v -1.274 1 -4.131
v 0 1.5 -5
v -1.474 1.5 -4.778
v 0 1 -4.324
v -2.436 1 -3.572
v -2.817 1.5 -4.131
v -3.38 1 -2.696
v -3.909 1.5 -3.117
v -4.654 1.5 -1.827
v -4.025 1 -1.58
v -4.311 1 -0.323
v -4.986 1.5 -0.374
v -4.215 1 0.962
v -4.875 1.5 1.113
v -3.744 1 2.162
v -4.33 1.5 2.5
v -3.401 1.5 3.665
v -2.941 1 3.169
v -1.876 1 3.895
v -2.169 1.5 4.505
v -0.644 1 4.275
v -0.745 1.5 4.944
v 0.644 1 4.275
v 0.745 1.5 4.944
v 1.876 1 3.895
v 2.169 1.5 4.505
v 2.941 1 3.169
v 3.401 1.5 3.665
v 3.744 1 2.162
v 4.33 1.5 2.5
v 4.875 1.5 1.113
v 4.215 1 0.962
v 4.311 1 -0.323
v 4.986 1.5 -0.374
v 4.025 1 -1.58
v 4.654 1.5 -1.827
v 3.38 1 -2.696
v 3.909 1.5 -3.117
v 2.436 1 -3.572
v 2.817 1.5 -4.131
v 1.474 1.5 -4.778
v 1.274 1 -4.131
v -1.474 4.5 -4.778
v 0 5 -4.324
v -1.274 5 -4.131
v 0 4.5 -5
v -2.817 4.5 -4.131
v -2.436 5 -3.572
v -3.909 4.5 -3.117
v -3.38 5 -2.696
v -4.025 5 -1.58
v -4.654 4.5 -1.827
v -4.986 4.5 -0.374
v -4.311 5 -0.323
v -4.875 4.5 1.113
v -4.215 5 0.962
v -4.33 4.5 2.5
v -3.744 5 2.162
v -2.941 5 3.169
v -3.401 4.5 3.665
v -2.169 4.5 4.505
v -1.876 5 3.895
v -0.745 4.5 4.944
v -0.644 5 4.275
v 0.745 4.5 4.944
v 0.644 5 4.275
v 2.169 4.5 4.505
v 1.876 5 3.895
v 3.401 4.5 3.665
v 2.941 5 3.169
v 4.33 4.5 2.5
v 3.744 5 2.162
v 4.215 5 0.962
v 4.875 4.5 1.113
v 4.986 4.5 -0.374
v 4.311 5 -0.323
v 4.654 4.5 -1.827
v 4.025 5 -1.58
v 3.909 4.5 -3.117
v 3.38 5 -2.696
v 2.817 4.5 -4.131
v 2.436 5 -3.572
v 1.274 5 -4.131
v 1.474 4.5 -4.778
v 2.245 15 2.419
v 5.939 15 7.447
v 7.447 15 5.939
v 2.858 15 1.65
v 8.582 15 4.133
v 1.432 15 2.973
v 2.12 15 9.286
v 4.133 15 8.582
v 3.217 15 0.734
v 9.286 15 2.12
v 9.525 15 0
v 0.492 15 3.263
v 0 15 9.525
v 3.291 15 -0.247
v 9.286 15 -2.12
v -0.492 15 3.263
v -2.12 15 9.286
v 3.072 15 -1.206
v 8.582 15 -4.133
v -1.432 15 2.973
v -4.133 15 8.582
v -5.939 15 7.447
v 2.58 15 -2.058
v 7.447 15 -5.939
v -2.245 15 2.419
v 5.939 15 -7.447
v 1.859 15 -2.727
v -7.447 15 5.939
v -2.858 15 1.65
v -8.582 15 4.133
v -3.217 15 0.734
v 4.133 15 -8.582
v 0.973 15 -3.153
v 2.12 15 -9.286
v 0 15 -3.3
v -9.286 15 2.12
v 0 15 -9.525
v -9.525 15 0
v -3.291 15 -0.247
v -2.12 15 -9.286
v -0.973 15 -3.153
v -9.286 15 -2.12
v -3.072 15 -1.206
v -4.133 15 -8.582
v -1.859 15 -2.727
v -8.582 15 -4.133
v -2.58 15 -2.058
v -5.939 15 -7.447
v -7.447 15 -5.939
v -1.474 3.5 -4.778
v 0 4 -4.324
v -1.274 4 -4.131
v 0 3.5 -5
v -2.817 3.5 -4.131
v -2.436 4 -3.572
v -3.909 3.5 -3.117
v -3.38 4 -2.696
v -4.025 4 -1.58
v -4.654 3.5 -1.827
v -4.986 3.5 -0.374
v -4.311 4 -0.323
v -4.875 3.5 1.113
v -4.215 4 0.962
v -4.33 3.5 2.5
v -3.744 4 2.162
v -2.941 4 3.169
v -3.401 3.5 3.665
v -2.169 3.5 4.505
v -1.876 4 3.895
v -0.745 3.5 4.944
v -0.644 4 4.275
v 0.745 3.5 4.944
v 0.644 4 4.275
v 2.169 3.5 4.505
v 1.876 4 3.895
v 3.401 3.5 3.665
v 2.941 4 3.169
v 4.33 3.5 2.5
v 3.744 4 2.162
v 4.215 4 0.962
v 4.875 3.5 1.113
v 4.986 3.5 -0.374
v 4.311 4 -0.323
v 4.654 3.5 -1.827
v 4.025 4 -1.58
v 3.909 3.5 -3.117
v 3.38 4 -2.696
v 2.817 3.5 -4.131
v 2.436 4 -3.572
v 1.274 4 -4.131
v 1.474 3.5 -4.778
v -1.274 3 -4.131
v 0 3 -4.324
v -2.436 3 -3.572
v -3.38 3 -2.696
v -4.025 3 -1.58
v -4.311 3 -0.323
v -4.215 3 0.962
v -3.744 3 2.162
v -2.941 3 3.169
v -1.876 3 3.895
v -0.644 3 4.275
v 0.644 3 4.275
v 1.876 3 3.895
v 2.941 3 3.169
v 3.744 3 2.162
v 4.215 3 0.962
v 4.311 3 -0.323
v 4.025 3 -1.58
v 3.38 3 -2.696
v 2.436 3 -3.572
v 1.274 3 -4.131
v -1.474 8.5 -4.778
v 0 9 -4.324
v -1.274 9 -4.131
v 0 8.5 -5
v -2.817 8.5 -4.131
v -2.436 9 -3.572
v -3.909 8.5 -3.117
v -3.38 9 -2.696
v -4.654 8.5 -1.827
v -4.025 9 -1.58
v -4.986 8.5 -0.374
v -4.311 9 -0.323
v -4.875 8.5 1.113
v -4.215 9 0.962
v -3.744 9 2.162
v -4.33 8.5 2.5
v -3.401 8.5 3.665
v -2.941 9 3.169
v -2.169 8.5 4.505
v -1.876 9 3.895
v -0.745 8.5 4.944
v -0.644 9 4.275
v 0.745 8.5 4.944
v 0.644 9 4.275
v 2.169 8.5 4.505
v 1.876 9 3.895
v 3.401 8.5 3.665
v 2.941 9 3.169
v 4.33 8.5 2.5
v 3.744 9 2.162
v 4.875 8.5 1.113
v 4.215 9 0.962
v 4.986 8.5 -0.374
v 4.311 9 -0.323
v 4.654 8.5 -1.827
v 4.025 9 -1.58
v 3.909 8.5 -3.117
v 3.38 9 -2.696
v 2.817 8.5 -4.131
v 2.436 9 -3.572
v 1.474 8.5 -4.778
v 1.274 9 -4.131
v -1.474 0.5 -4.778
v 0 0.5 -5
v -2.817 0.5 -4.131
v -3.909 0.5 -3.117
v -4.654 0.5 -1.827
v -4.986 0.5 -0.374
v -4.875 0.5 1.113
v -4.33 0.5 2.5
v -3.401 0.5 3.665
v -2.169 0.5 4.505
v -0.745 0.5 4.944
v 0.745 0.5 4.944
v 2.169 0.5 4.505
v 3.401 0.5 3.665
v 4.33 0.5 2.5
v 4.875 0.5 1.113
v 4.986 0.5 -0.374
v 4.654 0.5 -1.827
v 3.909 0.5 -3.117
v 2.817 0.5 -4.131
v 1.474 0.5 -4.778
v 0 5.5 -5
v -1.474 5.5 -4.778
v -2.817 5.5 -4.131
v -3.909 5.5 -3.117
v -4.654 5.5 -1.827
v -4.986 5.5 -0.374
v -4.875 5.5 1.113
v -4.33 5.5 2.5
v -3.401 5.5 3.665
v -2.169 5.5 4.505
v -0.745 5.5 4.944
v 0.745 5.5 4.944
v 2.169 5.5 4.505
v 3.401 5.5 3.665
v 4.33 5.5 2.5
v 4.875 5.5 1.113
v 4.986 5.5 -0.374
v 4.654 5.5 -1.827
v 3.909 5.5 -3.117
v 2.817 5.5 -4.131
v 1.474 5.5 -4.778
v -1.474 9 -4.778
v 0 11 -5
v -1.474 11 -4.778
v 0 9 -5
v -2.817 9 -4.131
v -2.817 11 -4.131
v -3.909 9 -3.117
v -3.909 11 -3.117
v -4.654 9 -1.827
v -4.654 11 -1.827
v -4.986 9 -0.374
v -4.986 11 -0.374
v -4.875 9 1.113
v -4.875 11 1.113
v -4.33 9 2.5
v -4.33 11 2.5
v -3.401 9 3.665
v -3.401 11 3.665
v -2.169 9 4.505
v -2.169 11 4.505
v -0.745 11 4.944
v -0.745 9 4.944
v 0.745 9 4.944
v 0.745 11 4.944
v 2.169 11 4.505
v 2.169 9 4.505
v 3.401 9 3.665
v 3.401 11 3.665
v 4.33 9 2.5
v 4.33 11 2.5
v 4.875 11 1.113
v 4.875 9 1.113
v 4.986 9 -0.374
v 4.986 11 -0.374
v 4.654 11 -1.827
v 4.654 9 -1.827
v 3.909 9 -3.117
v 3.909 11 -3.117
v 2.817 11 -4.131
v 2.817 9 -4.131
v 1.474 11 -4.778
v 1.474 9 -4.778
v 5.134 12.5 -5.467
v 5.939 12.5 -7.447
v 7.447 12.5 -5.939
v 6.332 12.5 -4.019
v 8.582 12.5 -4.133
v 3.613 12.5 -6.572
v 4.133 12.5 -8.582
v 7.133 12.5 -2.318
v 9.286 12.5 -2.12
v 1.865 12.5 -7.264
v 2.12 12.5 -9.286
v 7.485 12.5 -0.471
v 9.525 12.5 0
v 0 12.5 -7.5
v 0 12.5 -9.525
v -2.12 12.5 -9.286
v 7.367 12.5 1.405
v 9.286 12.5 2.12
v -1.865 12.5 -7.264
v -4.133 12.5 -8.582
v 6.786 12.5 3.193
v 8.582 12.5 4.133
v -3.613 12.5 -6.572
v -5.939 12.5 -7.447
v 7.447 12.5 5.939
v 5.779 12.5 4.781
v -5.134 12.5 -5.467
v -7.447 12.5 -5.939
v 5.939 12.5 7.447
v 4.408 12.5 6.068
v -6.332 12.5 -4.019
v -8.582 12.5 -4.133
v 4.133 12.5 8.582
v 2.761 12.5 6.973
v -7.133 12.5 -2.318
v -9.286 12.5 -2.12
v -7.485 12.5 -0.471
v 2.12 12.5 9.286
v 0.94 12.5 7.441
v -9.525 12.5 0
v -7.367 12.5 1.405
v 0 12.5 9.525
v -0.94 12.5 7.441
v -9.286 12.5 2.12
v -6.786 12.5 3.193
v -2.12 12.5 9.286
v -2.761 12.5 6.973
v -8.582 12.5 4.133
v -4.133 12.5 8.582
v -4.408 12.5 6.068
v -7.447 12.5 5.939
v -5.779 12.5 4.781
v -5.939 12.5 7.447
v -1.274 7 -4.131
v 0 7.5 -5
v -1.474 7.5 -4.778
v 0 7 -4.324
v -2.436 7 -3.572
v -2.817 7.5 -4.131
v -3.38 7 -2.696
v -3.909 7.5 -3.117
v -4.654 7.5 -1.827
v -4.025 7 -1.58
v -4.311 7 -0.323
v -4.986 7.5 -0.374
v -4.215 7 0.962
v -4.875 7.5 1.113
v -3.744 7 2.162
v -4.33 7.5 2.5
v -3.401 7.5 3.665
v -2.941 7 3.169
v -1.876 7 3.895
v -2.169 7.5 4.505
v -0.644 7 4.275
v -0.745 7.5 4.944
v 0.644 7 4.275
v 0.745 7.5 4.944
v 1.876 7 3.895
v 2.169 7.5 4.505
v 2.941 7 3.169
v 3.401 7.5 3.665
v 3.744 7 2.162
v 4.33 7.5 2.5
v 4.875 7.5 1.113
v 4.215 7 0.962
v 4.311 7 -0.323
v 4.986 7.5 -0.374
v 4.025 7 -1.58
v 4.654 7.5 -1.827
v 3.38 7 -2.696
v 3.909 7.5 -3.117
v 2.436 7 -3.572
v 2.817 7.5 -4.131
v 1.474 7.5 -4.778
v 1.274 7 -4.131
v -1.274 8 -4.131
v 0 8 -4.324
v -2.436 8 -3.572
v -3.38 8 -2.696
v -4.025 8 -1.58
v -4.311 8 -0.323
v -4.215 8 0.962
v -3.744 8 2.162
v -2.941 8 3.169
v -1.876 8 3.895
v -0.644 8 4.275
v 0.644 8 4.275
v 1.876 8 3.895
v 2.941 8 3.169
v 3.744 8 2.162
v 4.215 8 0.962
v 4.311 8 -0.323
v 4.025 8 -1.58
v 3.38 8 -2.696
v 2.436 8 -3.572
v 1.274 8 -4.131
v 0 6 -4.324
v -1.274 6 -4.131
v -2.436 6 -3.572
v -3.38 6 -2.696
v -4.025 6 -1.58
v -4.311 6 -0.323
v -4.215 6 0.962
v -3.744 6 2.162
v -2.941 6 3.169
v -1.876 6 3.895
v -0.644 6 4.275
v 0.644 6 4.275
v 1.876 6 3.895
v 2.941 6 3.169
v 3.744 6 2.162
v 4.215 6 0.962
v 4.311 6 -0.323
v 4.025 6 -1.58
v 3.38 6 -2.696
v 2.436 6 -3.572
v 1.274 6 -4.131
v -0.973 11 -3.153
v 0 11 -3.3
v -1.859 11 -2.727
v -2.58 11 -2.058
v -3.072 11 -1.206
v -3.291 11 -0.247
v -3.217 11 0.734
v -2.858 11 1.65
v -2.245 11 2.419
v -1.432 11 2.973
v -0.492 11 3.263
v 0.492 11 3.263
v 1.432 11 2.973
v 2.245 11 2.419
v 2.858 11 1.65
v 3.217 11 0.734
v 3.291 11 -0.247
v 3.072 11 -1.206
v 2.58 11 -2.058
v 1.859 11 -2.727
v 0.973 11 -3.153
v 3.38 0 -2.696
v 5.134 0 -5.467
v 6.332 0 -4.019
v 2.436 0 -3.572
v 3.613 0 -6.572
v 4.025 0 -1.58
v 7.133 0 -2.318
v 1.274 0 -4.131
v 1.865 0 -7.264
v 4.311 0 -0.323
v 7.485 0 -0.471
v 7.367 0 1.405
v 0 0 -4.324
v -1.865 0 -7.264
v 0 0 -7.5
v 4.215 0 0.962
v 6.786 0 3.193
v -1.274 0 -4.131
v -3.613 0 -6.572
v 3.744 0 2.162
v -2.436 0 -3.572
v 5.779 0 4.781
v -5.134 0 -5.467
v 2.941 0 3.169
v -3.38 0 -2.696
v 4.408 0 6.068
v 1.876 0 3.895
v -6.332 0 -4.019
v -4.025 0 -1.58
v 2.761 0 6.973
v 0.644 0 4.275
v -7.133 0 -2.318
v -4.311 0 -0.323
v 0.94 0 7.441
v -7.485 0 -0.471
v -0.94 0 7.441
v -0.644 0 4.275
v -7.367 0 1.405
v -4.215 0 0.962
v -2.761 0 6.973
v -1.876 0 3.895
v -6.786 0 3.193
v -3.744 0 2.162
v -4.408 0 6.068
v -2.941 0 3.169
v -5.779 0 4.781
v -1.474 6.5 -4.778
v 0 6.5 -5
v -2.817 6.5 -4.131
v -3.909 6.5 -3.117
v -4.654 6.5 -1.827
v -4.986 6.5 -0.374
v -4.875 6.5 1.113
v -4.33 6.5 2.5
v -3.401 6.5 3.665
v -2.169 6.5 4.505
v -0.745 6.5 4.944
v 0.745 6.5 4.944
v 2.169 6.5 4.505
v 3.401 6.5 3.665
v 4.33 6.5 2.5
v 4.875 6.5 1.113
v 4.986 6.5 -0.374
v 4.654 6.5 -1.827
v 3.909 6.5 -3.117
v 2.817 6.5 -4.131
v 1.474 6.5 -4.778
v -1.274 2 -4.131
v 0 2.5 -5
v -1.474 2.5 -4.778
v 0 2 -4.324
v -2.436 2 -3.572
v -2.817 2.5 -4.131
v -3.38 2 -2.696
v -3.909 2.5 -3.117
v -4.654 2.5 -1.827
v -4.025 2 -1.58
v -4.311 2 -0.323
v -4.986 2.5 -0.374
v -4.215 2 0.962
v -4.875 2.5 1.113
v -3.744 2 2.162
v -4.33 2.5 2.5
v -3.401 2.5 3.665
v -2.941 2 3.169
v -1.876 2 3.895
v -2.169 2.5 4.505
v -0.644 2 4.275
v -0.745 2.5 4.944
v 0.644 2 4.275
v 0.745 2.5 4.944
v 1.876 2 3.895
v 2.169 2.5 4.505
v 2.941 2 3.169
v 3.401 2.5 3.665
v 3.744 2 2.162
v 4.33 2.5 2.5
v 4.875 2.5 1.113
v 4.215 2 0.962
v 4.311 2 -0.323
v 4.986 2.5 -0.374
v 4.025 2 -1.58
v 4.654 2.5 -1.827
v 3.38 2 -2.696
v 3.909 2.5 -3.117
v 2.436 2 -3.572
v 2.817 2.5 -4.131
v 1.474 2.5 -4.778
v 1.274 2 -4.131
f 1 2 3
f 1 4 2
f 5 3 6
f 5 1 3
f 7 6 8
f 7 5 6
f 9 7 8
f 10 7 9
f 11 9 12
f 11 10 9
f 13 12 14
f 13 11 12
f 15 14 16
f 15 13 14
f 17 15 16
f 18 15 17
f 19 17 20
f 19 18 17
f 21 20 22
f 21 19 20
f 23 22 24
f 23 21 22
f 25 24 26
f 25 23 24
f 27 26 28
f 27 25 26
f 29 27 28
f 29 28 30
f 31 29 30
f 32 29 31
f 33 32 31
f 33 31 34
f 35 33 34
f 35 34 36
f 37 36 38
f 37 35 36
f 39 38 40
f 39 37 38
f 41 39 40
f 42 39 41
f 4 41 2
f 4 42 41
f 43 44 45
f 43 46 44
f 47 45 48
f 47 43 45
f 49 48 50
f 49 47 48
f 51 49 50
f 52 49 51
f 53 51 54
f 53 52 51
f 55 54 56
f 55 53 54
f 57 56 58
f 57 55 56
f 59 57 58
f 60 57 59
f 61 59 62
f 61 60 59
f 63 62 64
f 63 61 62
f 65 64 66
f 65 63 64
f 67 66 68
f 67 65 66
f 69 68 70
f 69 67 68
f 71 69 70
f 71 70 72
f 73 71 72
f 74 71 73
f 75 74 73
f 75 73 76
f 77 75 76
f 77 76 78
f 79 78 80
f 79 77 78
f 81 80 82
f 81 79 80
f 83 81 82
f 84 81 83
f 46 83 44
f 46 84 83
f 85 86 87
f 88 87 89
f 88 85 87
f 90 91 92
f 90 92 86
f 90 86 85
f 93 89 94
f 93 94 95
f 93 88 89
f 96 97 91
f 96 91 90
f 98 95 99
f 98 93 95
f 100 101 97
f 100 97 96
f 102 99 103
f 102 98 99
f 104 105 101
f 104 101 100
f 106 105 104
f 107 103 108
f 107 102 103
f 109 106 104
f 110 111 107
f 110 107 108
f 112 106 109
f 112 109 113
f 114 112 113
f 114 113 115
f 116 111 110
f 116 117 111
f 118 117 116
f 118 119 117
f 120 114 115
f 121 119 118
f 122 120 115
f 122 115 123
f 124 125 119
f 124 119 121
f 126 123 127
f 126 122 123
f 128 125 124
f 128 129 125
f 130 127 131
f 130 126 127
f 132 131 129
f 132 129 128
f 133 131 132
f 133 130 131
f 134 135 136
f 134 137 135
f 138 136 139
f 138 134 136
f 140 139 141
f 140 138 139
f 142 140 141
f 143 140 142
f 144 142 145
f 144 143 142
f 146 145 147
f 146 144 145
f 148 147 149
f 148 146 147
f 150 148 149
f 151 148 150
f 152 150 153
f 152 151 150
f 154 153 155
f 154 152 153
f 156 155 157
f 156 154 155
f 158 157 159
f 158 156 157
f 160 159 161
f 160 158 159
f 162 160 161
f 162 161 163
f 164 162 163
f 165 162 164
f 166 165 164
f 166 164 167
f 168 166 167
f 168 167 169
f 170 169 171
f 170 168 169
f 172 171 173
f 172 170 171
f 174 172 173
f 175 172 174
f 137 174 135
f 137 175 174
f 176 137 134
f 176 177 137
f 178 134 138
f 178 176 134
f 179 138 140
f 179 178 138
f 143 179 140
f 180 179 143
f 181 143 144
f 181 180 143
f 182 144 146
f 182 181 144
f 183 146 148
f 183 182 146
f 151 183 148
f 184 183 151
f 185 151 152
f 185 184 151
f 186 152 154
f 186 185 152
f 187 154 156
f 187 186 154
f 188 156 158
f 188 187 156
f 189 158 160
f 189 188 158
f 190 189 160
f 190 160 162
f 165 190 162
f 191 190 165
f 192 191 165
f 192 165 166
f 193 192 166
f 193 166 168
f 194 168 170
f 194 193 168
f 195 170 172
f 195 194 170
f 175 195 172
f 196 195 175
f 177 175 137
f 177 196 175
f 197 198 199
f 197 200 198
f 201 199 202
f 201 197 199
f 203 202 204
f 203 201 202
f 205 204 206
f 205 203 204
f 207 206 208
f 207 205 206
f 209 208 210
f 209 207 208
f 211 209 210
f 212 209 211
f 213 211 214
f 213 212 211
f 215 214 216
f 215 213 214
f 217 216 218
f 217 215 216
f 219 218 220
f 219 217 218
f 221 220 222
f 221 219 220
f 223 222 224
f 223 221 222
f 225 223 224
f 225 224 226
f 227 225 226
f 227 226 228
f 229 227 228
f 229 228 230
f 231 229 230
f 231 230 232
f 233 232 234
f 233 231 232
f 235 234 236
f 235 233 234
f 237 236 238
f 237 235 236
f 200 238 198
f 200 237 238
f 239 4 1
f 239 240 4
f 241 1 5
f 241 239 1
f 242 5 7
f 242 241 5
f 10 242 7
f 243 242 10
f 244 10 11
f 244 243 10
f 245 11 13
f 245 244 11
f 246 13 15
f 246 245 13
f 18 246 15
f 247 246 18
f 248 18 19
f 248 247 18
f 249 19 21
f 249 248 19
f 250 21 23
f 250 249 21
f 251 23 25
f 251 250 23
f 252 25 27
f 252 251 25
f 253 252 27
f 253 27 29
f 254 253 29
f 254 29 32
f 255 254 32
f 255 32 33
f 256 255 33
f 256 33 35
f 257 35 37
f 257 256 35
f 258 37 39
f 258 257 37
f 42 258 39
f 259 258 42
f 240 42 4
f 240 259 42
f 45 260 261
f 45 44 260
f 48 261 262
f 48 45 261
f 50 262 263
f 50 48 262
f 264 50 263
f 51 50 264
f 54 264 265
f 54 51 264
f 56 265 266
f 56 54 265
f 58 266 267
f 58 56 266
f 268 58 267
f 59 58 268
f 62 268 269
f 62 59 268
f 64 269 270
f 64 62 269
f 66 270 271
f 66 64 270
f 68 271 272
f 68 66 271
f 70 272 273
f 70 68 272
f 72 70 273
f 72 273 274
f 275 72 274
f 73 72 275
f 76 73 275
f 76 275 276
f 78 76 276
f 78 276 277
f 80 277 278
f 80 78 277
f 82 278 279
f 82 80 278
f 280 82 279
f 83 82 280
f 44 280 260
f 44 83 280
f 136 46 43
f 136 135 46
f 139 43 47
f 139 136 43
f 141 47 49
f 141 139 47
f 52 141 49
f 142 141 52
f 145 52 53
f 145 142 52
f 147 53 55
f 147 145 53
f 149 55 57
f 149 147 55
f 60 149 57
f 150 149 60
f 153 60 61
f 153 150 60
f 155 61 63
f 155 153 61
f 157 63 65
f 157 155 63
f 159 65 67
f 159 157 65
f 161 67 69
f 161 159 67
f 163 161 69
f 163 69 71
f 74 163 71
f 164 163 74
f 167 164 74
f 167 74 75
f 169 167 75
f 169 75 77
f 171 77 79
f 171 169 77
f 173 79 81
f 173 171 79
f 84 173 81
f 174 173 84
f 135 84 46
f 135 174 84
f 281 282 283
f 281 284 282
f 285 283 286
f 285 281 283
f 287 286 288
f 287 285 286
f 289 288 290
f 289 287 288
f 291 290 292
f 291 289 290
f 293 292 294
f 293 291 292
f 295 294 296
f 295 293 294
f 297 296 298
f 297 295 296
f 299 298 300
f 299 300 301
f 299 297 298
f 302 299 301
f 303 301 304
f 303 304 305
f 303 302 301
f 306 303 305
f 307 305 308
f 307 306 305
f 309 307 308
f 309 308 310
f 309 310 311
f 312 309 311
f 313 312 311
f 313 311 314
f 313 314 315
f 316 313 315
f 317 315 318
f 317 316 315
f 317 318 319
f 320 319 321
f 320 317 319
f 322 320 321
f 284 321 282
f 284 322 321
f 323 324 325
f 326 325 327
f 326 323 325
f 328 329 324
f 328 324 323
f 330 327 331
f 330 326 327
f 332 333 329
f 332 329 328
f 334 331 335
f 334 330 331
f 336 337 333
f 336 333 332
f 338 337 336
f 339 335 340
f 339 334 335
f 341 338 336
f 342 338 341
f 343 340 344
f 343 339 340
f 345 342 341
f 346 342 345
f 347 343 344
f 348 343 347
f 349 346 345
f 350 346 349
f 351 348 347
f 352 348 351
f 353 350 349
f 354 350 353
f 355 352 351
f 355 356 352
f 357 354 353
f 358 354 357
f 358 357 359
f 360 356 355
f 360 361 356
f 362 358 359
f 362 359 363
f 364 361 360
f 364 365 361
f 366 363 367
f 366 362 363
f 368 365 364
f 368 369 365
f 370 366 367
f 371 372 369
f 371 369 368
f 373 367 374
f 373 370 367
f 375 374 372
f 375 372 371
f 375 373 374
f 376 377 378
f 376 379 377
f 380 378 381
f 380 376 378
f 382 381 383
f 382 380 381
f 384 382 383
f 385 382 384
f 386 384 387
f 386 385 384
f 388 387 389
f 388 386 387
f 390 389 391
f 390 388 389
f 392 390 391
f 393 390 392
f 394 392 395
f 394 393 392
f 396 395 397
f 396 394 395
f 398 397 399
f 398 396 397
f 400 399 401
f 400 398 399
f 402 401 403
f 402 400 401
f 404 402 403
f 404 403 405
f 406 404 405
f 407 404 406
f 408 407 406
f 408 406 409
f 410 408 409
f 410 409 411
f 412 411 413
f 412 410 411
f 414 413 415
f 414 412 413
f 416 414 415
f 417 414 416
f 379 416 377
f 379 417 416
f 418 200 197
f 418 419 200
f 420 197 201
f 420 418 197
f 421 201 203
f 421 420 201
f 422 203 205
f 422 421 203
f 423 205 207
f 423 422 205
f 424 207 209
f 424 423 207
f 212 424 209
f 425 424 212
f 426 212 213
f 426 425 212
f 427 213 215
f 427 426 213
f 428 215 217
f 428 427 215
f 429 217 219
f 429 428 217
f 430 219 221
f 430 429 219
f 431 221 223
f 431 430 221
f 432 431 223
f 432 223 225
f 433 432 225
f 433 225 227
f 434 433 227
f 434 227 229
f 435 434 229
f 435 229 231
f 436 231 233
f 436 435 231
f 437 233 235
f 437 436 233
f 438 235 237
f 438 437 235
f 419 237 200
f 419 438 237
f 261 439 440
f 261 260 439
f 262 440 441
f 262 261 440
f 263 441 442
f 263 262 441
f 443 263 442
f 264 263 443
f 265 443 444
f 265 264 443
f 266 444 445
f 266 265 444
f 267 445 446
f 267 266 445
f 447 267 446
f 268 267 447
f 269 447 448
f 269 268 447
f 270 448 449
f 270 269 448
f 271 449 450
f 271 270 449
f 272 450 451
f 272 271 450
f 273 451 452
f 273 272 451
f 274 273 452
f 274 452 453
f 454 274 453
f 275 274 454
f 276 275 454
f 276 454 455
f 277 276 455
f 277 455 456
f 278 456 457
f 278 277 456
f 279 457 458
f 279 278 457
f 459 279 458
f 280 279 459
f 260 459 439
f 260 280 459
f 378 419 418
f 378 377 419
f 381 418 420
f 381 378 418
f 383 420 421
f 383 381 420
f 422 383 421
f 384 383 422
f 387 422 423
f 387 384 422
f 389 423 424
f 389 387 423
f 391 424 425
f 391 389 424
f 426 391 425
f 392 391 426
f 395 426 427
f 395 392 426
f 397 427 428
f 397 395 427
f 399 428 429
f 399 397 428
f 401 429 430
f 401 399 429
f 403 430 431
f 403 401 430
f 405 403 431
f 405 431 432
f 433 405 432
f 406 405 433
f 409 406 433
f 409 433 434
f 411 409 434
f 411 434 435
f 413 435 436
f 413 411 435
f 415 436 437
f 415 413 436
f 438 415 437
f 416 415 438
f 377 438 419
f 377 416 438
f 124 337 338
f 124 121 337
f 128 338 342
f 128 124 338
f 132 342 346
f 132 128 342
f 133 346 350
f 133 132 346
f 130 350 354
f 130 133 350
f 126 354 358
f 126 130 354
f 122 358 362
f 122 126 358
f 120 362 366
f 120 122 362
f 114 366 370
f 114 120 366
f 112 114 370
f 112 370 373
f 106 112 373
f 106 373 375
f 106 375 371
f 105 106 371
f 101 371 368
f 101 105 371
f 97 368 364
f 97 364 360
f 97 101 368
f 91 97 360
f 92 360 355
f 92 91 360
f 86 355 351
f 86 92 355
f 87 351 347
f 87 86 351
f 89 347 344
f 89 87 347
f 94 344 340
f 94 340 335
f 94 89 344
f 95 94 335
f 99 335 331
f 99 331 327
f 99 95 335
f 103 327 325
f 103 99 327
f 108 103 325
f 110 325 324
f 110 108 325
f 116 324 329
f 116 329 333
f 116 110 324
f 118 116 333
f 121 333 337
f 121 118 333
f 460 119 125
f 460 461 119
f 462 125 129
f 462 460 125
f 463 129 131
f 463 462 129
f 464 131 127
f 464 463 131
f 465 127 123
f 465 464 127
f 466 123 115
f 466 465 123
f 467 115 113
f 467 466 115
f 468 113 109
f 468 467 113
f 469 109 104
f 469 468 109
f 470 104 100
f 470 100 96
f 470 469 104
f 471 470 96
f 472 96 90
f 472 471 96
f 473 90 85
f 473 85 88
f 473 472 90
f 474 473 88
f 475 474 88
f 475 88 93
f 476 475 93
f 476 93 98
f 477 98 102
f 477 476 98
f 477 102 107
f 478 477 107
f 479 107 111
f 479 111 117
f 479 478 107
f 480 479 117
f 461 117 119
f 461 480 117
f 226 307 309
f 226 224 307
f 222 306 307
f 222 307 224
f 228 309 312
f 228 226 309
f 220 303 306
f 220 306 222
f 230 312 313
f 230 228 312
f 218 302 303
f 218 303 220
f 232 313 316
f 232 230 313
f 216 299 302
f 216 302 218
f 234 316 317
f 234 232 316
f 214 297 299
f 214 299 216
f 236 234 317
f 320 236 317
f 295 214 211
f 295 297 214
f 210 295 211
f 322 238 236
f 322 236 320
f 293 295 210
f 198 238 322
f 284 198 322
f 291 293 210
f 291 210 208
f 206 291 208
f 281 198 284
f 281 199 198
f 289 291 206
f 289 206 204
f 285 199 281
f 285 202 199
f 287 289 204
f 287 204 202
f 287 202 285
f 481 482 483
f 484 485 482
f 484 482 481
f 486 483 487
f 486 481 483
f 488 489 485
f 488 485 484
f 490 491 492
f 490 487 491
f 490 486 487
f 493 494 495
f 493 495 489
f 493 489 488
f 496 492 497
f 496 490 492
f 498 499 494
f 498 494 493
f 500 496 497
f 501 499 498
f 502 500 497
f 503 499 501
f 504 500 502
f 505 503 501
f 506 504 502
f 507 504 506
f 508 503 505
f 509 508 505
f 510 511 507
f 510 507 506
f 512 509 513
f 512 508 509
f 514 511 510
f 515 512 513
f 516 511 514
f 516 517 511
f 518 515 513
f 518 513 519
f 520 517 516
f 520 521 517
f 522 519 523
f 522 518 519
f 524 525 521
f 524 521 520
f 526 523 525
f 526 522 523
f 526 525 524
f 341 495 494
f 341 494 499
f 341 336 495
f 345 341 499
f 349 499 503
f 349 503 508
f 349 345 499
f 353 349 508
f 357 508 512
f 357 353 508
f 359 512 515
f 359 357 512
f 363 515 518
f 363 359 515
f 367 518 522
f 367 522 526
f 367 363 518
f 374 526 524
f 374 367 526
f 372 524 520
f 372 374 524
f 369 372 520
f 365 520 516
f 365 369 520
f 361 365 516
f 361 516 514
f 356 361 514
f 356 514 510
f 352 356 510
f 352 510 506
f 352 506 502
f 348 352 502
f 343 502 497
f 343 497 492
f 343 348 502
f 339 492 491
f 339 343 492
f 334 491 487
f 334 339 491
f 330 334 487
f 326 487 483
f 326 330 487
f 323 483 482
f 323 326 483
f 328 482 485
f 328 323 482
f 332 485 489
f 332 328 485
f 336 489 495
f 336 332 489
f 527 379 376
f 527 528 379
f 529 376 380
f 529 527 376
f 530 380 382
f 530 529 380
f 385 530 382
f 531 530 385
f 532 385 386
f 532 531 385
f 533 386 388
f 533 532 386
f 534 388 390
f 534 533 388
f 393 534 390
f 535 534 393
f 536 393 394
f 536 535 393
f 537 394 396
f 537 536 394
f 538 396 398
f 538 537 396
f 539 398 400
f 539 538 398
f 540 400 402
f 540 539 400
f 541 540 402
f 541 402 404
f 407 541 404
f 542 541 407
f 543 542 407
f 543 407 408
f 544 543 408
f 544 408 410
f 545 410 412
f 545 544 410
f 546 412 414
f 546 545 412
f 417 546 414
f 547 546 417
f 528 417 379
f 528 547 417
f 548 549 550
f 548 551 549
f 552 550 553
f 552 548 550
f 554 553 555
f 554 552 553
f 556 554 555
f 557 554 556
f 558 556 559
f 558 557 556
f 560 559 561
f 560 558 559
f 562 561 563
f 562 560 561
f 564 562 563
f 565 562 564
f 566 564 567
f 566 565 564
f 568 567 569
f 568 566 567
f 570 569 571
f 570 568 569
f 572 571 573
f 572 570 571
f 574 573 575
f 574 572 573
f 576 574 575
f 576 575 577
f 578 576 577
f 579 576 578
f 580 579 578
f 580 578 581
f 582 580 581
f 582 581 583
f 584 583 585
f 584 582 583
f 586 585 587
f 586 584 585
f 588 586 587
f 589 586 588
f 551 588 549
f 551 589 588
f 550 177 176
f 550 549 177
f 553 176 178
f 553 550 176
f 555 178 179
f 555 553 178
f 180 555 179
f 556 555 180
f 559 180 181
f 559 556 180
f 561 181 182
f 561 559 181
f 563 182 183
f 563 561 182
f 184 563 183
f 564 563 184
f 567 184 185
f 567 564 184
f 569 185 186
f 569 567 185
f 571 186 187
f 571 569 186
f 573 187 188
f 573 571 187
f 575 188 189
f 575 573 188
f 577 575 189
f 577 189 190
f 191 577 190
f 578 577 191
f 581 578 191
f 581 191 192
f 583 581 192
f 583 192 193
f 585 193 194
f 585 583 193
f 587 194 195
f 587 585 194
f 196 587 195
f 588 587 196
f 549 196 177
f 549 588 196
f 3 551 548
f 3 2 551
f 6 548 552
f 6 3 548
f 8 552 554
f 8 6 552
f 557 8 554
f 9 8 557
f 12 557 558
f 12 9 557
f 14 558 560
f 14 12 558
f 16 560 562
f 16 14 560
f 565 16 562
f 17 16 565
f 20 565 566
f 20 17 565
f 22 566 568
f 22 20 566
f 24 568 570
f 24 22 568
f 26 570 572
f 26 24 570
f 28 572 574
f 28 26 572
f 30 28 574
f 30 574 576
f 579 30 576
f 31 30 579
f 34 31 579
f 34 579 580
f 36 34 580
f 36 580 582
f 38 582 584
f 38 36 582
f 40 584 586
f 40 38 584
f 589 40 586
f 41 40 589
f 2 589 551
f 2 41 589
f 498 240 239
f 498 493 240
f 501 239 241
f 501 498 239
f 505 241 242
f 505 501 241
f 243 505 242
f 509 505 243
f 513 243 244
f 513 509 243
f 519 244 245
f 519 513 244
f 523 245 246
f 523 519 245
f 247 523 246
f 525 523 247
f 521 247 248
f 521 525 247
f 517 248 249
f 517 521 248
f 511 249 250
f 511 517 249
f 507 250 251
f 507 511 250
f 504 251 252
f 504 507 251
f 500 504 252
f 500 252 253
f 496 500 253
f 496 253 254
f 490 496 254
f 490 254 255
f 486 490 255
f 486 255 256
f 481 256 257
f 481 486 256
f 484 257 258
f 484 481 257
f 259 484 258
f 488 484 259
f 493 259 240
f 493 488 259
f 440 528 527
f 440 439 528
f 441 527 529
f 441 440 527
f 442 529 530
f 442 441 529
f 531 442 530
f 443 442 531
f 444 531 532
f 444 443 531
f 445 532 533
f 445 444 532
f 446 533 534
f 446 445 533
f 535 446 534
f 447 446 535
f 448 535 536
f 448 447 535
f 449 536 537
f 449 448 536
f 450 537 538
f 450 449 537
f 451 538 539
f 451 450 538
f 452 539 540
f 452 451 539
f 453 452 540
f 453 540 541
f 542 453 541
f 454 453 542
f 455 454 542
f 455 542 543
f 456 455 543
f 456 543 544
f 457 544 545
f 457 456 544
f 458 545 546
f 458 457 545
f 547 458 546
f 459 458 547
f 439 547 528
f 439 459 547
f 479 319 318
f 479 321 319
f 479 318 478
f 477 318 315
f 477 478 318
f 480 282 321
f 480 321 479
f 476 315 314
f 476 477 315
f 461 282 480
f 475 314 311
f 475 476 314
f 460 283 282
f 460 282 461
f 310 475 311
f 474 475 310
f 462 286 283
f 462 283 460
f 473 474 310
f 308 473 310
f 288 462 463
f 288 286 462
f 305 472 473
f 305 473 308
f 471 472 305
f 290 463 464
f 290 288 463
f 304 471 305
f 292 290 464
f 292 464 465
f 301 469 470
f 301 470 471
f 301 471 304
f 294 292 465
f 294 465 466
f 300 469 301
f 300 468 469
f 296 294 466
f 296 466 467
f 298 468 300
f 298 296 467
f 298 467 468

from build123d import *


with BuildPart() as part:
    # Sketch1 → Revolve1 (revolve)
    with BuildSketch(Plane.XY, mode=Mode.PRIVATE) as revolve1_sk:
        Polygon((7.5, 0), (7.5, 12.5), (9.525, 12.5), (9.525, 15), (3.3, 15), (3.3, 11), (5, 11), (5, 9), (4.3235, 9), (5, 8.5), (4.3235, 8), (5, 7.5), (4.3235, 7), (5, 6.5), (4.3235, 6), (5, 5.5), (4.3235, 5), (5, 4.5), (4.3235, 4), (5, 3.5), (4.3235, 3), (5, 2.5), (4.3235, 2), (5, 1.5), (4.3235, 1), (5, 0.5), (4.3235, 0), align=None)
    revolve(revolve1_sk.sketch.rotate(Axis((0, 0, 0), (0, 1, 0)), 90), axis=Axis((0, 0, 0), (0, 1, 0)))  # turned: the seam where the file's is


solid = part.part
